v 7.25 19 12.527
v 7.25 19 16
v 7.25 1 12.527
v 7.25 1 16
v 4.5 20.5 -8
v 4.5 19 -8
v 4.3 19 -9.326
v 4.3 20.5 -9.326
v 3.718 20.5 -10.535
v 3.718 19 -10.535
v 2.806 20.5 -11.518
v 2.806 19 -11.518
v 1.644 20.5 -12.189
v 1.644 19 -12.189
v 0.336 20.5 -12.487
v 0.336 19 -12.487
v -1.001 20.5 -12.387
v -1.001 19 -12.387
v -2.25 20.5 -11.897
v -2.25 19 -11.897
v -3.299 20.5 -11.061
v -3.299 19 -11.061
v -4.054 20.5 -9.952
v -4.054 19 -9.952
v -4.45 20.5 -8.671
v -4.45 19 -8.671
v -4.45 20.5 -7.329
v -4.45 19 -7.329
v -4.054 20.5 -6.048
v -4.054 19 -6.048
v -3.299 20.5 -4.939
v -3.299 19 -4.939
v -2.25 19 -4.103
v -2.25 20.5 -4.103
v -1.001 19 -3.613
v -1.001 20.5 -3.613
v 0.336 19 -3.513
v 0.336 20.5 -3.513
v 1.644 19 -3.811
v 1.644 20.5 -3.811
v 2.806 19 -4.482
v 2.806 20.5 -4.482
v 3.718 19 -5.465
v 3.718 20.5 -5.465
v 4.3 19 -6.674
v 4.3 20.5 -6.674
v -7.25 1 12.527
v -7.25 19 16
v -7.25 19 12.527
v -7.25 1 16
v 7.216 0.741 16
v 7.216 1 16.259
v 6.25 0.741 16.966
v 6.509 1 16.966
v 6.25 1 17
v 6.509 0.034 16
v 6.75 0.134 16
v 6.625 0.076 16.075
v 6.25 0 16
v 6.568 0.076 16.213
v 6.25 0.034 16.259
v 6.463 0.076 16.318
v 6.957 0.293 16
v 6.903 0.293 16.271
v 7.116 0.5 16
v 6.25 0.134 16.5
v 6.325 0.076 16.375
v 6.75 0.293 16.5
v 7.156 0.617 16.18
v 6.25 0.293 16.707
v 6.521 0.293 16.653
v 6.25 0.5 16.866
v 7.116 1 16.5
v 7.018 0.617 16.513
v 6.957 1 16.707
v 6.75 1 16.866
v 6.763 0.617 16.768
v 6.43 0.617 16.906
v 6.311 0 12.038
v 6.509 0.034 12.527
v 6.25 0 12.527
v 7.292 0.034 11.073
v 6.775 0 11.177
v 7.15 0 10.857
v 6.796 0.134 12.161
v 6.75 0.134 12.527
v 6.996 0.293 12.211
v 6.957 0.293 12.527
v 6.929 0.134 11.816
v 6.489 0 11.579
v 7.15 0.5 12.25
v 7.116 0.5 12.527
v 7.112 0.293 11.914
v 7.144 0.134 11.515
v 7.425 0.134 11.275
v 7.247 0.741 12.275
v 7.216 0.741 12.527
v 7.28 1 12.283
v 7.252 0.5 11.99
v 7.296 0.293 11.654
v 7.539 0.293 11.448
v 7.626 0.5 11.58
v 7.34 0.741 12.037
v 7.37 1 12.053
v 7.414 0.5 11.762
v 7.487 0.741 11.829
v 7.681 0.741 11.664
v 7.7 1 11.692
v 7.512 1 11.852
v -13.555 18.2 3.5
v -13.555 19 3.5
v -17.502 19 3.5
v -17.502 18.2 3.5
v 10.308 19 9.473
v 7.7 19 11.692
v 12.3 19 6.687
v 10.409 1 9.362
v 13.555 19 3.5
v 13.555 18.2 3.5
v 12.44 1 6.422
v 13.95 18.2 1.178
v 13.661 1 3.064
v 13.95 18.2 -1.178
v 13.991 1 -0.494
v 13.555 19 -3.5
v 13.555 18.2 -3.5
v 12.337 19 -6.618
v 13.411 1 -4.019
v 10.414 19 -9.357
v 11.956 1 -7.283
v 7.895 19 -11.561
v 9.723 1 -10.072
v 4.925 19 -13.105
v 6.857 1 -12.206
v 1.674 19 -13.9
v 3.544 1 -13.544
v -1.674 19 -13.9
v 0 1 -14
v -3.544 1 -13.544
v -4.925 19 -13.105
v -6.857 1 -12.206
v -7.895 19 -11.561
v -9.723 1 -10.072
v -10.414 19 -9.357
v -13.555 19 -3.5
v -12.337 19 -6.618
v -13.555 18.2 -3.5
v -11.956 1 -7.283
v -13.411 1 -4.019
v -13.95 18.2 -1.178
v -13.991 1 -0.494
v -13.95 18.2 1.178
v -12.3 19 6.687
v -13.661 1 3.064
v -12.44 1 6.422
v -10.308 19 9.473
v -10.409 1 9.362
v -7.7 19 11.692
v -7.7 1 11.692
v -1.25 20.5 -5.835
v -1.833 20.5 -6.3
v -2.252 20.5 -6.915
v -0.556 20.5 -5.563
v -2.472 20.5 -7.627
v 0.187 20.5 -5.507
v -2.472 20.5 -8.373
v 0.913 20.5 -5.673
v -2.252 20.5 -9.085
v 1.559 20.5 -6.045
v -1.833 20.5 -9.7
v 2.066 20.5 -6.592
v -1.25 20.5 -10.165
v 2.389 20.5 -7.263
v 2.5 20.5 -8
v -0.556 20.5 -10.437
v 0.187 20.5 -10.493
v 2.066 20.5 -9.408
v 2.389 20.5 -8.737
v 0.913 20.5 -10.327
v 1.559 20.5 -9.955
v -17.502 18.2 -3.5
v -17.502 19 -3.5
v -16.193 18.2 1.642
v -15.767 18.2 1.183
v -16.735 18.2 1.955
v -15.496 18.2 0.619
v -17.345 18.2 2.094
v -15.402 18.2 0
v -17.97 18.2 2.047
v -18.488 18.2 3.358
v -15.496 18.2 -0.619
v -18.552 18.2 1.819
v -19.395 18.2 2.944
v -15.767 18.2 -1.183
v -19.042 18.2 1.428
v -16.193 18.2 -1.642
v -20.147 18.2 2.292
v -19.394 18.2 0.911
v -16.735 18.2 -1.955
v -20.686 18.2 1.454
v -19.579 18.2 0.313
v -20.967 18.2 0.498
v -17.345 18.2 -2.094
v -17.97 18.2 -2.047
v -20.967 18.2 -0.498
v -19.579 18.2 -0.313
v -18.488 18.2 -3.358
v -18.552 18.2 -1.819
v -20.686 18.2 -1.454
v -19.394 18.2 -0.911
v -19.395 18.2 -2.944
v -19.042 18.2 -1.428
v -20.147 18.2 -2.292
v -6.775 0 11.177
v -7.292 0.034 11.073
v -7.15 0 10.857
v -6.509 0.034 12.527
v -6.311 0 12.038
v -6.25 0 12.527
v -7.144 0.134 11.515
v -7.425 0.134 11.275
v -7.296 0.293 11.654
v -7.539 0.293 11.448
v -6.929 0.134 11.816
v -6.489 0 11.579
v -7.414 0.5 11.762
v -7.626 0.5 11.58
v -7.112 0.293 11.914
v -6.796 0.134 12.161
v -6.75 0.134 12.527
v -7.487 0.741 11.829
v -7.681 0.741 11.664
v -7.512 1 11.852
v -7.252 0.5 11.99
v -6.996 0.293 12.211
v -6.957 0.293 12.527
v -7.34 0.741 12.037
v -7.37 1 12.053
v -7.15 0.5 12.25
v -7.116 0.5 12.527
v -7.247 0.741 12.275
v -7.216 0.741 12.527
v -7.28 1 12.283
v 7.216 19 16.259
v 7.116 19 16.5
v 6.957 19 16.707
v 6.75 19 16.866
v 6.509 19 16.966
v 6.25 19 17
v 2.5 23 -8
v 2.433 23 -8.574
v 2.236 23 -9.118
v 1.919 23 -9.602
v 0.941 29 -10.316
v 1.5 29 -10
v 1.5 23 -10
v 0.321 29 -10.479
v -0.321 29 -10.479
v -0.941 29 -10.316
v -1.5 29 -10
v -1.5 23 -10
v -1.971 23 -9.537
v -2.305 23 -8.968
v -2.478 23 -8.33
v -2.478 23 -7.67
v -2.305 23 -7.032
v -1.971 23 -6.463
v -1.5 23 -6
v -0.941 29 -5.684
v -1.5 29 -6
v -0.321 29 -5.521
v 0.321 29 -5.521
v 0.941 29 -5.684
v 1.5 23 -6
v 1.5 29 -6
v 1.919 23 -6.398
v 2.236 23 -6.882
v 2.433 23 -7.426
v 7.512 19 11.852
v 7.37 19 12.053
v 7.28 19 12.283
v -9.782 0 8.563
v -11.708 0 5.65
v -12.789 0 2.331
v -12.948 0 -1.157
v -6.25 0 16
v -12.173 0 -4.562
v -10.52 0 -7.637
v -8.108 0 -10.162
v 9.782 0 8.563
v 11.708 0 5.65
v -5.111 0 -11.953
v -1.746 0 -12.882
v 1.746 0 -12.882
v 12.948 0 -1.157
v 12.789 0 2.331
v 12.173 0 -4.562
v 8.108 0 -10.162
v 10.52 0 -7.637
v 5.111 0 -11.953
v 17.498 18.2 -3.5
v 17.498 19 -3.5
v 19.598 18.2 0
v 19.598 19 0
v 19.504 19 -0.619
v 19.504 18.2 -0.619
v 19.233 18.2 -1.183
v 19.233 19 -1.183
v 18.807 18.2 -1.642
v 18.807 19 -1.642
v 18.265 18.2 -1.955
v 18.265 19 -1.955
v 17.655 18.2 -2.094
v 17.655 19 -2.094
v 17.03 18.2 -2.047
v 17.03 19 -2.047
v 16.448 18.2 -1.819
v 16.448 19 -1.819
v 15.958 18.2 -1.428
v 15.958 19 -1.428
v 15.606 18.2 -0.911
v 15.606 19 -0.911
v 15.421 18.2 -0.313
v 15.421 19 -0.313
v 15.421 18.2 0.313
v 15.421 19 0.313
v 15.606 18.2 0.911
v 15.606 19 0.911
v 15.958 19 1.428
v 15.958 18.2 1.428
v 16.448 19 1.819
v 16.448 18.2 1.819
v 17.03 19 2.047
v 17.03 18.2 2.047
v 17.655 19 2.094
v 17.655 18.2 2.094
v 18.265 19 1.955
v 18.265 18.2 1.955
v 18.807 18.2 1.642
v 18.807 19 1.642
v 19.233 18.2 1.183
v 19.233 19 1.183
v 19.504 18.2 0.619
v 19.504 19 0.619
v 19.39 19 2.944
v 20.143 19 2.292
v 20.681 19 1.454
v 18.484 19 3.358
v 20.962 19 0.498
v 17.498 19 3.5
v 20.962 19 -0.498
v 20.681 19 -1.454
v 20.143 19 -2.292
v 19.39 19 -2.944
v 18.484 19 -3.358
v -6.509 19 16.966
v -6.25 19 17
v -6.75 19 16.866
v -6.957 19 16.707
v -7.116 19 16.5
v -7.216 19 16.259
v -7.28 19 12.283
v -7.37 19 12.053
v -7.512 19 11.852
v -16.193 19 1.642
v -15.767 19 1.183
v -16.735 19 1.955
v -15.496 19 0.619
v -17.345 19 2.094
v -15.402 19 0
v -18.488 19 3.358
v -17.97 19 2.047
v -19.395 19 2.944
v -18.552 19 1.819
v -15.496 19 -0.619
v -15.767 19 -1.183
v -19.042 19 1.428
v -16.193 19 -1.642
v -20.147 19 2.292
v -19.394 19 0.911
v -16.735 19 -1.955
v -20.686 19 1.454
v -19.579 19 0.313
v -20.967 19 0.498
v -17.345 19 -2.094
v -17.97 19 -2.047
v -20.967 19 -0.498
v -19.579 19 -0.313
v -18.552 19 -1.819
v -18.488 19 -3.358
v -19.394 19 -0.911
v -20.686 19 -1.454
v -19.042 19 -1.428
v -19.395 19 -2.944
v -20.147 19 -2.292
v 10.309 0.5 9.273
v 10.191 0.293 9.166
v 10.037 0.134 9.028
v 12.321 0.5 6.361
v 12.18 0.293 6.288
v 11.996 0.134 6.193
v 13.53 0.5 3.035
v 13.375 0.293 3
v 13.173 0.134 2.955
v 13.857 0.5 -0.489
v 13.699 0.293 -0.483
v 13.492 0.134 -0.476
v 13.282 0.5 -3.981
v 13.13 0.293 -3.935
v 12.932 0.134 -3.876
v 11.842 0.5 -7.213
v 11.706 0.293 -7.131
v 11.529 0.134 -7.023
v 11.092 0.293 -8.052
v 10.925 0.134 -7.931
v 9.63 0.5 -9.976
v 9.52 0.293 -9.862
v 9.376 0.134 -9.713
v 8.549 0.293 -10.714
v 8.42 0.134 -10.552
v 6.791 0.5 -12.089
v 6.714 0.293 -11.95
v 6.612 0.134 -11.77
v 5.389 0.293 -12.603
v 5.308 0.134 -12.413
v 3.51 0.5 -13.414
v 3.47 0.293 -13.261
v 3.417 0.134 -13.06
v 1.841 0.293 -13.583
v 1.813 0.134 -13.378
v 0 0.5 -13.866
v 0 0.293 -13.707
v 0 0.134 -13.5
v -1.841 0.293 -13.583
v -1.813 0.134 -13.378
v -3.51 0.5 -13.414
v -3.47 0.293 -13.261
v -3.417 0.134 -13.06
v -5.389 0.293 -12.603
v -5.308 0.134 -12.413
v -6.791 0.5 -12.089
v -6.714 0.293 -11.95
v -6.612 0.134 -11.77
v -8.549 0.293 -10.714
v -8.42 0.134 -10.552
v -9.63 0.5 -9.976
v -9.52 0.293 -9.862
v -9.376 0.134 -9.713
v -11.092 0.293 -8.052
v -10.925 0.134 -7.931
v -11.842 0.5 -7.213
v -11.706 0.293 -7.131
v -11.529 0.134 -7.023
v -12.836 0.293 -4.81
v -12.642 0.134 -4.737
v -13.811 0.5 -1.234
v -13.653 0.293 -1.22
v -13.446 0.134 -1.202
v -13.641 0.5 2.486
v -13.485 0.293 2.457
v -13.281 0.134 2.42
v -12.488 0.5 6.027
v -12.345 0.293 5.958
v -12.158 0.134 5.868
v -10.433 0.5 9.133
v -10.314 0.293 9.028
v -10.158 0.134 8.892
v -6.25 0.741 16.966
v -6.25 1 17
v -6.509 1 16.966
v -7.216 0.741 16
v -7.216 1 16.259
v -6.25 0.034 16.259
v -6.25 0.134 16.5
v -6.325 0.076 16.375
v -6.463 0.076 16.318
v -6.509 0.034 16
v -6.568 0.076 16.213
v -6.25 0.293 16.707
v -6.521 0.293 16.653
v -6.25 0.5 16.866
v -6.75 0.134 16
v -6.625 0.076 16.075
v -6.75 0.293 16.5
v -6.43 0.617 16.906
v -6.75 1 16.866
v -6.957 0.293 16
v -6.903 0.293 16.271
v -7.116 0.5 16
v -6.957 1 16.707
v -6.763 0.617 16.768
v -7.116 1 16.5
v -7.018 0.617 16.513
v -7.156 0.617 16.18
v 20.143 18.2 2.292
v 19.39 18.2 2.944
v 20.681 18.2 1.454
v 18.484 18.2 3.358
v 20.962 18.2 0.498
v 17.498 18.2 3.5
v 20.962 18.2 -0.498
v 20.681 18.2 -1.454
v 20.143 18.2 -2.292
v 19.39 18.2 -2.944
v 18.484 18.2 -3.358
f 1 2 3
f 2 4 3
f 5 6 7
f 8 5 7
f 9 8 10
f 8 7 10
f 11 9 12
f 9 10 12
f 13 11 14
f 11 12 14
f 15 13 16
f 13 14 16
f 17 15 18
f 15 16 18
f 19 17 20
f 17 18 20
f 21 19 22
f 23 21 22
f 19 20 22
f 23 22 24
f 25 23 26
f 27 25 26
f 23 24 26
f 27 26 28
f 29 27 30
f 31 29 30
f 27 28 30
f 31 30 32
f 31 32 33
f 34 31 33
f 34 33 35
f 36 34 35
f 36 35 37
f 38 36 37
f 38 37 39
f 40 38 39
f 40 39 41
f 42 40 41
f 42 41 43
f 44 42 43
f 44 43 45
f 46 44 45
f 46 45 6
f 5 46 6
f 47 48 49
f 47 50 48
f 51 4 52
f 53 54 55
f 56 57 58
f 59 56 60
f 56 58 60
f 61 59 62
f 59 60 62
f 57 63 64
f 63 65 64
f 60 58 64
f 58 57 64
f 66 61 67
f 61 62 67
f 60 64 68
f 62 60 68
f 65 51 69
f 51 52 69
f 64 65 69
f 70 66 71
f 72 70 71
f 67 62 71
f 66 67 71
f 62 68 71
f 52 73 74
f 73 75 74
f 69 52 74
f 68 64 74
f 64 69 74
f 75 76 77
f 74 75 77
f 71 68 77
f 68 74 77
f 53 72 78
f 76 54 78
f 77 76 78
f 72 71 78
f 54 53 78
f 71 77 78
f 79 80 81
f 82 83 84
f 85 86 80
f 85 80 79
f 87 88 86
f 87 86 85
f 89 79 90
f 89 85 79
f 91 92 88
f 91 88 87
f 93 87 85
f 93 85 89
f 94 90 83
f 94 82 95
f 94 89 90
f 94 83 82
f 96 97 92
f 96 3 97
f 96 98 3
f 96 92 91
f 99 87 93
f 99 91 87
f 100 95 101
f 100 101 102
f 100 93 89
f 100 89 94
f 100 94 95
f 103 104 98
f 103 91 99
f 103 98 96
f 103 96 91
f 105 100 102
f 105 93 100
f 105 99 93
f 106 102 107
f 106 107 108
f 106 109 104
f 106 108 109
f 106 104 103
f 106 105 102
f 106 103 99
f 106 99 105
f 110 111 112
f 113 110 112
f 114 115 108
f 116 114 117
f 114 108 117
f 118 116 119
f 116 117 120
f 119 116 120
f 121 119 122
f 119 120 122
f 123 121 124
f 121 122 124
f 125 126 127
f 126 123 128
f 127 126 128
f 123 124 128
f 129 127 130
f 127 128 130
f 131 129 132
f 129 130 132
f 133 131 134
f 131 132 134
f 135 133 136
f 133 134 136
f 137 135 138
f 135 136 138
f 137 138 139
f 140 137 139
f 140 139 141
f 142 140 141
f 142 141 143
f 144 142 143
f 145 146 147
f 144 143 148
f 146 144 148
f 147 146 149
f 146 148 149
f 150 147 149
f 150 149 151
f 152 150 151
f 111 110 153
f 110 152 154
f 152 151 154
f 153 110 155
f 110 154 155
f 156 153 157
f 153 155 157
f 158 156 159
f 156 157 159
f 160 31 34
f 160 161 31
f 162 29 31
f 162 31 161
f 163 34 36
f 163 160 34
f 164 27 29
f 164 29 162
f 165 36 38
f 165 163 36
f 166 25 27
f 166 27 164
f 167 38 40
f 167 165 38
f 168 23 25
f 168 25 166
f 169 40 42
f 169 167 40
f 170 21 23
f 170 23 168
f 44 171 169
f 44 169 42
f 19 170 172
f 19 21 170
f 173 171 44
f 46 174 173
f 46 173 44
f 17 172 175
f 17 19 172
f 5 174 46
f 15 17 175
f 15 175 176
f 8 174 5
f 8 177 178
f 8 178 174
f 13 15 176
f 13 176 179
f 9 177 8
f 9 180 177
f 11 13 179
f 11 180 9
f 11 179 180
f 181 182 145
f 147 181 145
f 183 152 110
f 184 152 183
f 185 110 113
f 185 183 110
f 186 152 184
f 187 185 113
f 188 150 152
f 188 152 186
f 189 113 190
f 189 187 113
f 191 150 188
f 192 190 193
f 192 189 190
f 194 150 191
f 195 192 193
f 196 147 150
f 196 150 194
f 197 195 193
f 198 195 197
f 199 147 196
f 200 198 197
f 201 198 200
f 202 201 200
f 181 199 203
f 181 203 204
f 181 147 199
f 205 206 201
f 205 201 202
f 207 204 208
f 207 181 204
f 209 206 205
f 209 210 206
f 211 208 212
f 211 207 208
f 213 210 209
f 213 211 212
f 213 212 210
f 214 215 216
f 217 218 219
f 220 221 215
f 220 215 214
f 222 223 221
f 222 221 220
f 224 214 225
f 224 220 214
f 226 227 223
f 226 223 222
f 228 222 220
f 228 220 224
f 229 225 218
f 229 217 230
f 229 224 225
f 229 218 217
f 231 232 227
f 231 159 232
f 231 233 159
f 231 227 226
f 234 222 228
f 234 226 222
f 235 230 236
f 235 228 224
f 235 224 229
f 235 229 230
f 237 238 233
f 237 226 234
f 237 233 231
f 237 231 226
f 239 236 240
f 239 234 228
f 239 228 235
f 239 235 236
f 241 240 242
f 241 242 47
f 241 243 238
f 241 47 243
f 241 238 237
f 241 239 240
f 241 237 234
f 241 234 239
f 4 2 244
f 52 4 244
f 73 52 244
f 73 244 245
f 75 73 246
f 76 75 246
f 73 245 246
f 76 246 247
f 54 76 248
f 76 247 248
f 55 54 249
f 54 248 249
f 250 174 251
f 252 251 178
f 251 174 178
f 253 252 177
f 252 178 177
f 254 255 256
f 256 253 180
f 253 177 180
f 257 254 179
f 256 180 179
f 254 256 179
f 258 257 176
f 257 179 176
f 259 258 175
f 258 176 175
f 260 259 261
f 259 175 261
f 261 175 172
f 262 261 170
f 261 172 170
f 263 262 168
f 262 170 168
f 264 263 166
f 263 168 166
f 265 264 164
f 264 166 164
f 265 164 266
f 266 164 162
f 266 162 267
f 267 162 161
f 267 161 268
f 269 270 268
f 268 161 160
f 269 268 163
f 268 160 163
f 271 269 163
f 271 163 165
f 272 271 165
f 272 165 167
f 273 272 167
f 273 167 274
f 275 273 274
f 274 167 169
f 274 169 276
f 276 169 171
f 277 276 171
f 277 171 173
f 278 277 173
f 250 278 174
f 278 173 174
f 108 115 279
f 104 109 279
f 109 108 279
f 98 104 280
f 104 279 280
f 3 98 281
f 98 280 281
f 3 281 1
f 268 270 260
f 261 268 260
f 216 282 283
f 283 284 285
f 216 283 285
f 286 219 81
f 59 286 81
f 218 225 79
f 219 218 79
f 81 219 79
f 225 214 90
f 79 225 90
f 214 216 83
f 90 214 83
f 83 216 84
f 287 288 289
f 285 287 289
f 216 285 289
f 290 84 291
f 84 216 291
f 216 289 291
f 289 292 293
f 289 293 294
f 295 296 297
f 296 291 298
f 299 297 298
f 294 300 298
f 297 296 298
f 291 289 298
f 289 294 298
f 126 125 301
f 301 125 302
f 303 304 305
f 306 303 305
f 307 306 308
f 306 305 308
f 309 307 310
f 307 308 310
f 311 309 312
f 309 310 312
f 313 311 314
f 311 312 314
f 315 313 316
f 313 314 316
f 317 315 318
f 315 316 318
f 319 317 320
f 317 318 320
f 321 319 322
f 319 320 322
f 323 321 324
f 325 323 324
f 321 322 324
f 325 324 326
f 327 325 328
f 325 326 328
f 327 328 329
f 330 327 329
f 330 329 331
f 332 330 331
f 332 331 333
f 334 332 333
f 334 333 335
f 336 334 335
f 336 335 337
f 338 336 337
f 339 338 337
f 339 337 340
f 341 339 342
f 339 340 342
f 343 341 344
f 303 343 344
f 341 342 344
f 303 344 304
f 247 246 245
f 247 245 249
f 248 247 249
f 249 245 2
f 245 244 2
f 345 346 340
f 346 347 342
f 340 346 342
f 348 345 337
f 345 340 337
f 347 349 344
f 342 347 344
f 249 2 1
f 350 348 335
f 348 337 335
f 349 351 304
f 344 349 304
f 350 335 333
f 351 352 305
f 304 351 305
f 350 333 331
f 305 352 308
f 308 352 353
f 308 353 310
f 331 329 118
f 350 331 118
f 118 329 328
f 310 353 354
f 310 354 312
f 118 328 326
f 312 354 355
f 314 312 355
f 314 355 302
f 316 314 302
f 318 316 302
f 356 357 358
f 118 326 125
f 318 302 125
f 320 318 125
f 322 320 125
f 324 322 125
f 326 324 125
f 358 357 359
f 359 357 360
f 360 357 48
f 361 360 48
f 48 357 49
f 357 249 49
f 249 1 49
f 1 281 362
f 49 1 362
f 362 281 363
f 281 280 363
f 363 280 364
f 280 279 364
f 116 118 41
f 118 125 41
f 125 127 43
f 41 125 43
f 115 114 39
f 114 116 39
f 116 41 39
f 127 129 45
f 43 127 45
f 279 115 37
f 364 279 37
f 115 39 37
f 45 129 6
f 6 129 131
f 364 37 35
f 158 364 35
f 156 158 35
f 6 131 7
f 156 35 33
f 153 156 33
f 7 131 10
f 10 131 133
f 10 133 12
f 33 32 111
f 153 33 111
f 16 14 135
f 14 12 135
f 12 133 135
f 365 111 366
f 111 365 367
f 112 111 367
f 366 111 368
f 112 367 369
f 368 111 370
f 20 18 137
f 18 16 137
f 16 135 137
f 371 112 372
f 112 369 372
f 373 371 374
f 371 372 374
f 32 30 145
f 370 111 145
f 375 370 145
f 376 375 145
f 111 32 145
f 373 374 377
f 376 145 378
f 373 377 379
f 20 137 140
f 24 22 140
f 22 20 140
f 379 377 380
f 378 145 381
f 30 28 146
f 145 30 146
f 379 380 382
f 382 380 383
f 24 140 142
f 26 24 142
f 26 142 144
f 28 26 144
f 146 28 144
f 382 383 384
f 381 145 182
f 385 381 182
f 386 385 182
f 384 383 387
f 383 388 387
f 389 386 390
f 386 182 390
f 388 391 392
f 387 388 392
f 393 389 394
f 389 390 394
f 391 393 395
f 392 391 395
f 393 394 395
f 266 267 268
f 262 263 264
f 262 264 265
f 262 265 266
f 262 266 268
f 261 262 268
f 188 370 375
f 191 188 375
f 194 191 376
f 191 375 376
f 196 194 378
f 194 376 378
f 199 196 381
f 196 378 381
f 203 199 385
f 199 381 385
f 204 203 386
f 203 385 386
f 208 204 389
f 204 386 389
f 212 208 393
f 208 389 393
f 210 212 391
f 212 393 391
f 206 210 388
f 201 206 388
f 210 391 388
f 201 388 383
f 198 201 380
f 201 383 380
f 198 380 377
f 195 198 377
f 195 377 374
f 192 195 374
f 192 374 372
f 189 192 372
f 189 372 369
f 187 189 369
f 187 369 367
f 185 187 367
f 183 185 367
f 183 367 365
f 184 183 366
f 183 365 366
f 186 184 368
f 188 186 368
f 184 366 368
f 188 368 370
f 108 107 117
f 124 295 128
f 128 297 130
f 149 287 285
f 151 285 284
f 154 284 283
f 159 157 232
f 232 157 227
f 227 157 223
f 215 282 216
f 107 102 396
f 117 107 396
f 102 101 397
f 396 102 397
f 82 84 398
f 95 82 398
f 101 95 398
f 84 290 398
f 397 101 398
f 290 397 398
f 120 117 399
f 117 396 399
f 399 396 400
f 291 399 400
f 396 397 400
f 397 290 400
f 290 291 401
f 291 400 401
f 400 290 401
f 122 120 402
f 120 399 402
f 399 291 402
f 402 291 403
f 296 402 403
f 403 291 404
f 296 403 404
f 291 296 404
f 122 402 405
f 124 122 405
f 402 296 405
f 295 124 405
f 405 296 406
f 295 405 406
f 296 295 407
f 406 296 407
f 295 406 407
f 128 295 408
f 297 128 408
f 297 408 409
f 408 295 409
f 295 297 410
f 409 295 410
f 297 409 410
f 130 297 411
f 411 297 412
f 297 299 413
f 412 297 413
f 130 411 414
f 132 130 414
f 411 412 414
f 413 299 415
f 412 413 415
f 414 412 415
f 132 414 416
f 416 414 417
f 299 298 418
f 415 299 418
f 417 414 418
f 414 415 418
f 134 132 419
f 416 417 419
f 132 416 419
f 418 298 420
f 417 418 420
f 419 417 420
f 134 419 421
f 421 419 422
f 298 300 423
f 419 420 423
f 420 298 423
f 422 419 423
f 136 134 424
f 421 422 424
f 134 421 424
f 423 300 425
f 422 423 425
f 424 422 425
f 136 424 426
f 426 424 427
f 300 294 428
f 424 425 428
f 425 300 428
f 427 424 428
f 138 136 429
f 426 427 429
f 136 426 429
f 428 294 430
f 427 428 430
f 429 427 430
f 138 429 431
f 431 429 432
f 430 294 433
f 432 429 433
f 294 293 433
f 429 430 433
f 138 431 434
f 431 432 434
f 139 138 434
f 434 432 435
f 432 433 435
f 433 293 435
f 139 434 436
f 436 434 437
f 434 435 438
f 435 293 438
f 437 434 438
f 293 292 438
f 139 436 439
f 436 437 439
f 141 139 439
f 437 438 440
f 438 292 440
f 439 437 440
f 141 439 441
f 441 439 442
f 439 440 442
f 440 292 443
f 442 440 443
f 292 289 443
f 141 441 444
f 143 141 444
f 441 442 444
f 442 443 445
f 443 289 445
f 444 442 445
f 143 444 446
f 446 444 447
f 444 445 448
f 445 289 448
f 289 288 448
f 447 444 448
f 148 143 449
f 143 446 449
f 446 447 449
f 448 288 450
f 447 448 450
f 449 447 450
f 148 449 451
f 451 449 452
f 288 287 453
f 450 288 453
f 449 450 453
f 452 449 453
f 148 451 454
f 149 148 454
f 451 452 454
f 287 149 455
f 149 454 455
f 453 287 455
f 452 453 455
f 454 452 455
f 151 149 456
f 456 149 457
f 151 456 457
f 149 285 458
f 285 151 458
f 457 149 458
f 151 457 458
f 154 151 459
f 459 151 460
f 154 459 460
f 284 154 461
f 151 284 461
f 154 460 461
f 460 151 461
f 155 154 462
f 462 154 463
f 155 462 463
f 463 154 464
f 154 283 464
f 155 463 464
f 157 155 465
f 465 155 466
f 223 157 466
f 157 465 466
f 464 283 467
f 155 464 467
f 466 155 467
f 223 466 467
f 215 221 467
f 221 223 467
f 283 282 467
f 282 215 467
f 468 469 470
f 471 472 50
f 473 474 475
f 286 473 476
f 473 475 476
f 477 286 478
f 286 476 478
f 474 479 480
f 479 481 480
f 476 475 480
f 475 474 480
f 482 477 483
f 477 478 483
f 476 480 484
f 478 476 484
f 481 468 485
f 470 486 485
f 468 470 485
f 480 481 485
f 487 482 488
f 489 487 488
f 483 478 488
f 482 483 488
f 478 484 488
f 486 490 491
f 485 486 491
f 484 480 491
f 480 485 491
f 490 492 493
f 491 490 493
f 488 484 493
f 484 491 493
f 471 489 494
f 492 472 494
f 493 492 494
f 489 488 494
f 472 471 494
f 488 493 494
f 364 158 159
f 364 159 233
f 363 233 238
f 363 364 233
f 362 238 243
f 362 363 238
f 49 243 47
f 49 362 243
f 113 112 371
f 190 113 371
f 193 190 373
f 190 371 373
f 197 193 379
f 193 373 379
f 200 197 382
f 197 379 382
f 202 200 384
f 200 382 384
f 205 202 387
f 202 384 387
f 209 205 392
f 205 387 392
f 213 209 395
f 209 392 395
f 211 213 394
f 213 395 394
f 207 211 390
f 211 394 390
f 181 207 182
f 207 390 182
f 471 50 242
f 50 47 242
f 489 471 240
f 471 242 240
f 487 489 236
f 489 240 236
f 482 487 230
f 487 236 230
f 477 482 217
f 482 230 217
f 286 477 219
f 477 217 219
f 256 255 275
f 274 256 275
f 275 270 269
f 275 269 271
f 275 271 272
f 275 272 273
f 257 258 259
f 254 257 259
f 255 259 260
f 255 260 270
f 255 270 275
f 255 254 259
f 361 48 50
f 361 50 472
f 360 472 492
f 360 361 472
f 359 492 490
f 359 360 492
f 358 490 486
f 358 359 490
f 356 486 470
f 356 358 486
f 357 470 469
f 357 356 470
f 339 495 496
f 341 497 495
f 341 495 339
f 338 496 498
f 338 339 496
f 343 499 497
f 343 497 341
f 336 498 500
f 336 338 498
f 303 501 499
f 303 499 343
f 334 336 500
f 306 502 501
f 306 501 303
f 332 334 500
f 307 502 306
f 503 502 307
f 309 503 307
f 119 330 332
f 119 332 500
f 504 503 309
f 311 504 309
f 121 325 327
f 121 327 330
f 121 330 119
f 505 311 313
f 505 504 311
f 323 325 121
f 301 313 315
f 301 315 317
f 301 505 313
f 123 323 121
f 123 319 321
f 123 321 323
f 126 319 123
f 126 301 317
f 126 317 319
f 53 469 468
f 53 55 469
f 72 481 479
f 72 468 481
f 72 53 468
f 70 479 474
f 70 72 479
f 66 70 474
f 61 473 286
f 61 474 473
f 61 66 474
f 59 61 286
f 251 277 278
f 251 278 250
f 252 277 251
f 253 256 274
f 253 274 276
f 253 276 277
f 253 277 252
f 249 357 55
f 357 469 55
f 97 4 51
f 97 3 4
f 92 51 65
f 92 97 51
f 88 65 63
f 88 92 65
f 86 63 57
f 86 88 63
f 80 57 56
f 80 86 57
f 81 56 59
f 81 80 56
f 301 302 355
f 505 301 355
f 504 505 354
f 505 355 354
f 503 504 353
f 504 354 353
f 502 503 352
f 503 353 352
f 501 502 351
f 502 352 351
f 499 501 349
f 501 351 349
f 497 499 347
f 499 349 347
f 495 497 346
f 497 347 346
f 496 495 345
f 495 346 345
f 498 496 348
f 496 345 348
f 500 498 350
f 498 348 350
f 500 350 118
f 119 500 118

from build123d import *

# Parameters (mm, degrees)
SKETCH1_R           = 14
SKETCH1_W           = 14.5
SKETCH1_H           = 17
BOSS_EXTRUDE1_DEPTH = 19
SKETCH2_R           = 4.5
BOSS_EXTRUDE2_DEPTH = 1.5
SKETCH2_3_R         = 2.5
BOSS_EXTRUDE3_DEPTH = 10
CUT_EXTRUDE1_START  = -6
CUT_EXTRUDE1_DEPTH  = 6
FILLET1_R           = 1
SKETCH4_R           = 2.1
BOSS_EXTRUDE4_DEPTH = 0.8


with BuildPart() as part:
    # Sketch1 → Boss-Extrude1 (new body)
    with BuildSketch(Plane(origin=(0, 0, 0), x_dir=(1, 0, 0), z_dir=(0, 1, 0))):
        Circle(SKETCH1_R)
        with Locations((0, -8.5)):
            Rectangle(SKETCH1_W, SKETCH1_H)
    extrude(amount=BOSS_EXTRUDE1_DEPTH)

    # Sketch2 → Boss-Extrude2 (add)
    with BuildSketch(Plane(origin=(0, 19, 0), x_dir=(1, 0, 0), z_dir=(0, 1, 0))):
        with Locations((0, 8.000000036)):
            Circle(SKETCH2_R)
    extrude(amount=BOSS_EXTRUDE2_DEPTH)

    # Sketch2<3> → Boss-Extrude3 (add)
    with BuildSketch(Plane(origin=(0, 19, 0), x_dir=(1, 0, 0), z_dir=(0, 1, 0))):
        with Locations((0, 8.000000036)):
            Circle(SKETCH2_3_R)
    extrude(amount=BOSS_EXTRUDE3_DEPTH)

    # Sketch3 → Cut-Extrude1 (cut)
    with BuildSketch(Plane(origin=(0, 29, 0), x_dir=(1, 0, 0), z_dir=(0, 1, 0)).offset(CUT_EXTRUDE1_START)):
        with BuildLine():
            Line((-1.5, 6.000000036), (-1.5, 10.000000036))
            ThreePointArc((-1.5, 10.000000036), (-2.5, 8.000000036), (-1.5, 6.000000036))
        make_face()
        with BuildLine():
            ThreePointArc((1.5, 6.000000036), (2.5, 8.000000036), (1.5, 10.000000036))
            Line((1.5, 10.000000036), (1.5, 6.000000036))
        make_face()
    extrude(amount=CUT_EXTRUDE1_DEPTH, mode=Mode.SUBTRACT)

    # Fillet1
    fillet1_edges = [part.edges().sort_by_distance(p)[0] for p in [
        (-7.25, 0, 14.488269784),
        (0, 0, 17),
        (7.25, 0, 14.488269784),
        (0, 0, -14),
        (7.25, 9.5, 11.976539567),
        (-7.25, 9.5, 11.976539567),
        (-7.25, 9.5, 17),
        (7.25, 9.5, 17),
    ]]
    fillet(fillet1_edges, radius=FILLET1_R)

    # Sketch4 → Boss-Extrude4 (add)
    with BuildSketch(Plane(origin=(0, 19, 0), x_dir=(1, 0, 0), z_dir=(0, 1, 0))):
        with BuildLine():
            Line((-17.502332169, 3.500000036), (17.497667831, 3.500000036))
            ThreePointArc((17.497667831, 3.500000036), (20.997667831, 3.6e-08), (17.497667831, -3.499999964))
            Line((17.497667831, -3.499999964), (-17.502332169, -3.499999964))
            ThreePointArc((-17.502332169, -3.499999964), (-21.002332169, 3.6e-08), (-17.502332169, 3.500000036))
        make_face()
        with Locations((17.497667831, 3.6e-08)):
            Circle(SKETCH4_R, mode=Mode.SUBTRACT)
        with Locations((-17.502332169, 3.6e-08)):
            Circle(SKETCH4_R, mode=Mode.SUBTRACT)
    extrude(amount=-BOSS_EXTRUDE4_DEPTH)


solid = part.part
